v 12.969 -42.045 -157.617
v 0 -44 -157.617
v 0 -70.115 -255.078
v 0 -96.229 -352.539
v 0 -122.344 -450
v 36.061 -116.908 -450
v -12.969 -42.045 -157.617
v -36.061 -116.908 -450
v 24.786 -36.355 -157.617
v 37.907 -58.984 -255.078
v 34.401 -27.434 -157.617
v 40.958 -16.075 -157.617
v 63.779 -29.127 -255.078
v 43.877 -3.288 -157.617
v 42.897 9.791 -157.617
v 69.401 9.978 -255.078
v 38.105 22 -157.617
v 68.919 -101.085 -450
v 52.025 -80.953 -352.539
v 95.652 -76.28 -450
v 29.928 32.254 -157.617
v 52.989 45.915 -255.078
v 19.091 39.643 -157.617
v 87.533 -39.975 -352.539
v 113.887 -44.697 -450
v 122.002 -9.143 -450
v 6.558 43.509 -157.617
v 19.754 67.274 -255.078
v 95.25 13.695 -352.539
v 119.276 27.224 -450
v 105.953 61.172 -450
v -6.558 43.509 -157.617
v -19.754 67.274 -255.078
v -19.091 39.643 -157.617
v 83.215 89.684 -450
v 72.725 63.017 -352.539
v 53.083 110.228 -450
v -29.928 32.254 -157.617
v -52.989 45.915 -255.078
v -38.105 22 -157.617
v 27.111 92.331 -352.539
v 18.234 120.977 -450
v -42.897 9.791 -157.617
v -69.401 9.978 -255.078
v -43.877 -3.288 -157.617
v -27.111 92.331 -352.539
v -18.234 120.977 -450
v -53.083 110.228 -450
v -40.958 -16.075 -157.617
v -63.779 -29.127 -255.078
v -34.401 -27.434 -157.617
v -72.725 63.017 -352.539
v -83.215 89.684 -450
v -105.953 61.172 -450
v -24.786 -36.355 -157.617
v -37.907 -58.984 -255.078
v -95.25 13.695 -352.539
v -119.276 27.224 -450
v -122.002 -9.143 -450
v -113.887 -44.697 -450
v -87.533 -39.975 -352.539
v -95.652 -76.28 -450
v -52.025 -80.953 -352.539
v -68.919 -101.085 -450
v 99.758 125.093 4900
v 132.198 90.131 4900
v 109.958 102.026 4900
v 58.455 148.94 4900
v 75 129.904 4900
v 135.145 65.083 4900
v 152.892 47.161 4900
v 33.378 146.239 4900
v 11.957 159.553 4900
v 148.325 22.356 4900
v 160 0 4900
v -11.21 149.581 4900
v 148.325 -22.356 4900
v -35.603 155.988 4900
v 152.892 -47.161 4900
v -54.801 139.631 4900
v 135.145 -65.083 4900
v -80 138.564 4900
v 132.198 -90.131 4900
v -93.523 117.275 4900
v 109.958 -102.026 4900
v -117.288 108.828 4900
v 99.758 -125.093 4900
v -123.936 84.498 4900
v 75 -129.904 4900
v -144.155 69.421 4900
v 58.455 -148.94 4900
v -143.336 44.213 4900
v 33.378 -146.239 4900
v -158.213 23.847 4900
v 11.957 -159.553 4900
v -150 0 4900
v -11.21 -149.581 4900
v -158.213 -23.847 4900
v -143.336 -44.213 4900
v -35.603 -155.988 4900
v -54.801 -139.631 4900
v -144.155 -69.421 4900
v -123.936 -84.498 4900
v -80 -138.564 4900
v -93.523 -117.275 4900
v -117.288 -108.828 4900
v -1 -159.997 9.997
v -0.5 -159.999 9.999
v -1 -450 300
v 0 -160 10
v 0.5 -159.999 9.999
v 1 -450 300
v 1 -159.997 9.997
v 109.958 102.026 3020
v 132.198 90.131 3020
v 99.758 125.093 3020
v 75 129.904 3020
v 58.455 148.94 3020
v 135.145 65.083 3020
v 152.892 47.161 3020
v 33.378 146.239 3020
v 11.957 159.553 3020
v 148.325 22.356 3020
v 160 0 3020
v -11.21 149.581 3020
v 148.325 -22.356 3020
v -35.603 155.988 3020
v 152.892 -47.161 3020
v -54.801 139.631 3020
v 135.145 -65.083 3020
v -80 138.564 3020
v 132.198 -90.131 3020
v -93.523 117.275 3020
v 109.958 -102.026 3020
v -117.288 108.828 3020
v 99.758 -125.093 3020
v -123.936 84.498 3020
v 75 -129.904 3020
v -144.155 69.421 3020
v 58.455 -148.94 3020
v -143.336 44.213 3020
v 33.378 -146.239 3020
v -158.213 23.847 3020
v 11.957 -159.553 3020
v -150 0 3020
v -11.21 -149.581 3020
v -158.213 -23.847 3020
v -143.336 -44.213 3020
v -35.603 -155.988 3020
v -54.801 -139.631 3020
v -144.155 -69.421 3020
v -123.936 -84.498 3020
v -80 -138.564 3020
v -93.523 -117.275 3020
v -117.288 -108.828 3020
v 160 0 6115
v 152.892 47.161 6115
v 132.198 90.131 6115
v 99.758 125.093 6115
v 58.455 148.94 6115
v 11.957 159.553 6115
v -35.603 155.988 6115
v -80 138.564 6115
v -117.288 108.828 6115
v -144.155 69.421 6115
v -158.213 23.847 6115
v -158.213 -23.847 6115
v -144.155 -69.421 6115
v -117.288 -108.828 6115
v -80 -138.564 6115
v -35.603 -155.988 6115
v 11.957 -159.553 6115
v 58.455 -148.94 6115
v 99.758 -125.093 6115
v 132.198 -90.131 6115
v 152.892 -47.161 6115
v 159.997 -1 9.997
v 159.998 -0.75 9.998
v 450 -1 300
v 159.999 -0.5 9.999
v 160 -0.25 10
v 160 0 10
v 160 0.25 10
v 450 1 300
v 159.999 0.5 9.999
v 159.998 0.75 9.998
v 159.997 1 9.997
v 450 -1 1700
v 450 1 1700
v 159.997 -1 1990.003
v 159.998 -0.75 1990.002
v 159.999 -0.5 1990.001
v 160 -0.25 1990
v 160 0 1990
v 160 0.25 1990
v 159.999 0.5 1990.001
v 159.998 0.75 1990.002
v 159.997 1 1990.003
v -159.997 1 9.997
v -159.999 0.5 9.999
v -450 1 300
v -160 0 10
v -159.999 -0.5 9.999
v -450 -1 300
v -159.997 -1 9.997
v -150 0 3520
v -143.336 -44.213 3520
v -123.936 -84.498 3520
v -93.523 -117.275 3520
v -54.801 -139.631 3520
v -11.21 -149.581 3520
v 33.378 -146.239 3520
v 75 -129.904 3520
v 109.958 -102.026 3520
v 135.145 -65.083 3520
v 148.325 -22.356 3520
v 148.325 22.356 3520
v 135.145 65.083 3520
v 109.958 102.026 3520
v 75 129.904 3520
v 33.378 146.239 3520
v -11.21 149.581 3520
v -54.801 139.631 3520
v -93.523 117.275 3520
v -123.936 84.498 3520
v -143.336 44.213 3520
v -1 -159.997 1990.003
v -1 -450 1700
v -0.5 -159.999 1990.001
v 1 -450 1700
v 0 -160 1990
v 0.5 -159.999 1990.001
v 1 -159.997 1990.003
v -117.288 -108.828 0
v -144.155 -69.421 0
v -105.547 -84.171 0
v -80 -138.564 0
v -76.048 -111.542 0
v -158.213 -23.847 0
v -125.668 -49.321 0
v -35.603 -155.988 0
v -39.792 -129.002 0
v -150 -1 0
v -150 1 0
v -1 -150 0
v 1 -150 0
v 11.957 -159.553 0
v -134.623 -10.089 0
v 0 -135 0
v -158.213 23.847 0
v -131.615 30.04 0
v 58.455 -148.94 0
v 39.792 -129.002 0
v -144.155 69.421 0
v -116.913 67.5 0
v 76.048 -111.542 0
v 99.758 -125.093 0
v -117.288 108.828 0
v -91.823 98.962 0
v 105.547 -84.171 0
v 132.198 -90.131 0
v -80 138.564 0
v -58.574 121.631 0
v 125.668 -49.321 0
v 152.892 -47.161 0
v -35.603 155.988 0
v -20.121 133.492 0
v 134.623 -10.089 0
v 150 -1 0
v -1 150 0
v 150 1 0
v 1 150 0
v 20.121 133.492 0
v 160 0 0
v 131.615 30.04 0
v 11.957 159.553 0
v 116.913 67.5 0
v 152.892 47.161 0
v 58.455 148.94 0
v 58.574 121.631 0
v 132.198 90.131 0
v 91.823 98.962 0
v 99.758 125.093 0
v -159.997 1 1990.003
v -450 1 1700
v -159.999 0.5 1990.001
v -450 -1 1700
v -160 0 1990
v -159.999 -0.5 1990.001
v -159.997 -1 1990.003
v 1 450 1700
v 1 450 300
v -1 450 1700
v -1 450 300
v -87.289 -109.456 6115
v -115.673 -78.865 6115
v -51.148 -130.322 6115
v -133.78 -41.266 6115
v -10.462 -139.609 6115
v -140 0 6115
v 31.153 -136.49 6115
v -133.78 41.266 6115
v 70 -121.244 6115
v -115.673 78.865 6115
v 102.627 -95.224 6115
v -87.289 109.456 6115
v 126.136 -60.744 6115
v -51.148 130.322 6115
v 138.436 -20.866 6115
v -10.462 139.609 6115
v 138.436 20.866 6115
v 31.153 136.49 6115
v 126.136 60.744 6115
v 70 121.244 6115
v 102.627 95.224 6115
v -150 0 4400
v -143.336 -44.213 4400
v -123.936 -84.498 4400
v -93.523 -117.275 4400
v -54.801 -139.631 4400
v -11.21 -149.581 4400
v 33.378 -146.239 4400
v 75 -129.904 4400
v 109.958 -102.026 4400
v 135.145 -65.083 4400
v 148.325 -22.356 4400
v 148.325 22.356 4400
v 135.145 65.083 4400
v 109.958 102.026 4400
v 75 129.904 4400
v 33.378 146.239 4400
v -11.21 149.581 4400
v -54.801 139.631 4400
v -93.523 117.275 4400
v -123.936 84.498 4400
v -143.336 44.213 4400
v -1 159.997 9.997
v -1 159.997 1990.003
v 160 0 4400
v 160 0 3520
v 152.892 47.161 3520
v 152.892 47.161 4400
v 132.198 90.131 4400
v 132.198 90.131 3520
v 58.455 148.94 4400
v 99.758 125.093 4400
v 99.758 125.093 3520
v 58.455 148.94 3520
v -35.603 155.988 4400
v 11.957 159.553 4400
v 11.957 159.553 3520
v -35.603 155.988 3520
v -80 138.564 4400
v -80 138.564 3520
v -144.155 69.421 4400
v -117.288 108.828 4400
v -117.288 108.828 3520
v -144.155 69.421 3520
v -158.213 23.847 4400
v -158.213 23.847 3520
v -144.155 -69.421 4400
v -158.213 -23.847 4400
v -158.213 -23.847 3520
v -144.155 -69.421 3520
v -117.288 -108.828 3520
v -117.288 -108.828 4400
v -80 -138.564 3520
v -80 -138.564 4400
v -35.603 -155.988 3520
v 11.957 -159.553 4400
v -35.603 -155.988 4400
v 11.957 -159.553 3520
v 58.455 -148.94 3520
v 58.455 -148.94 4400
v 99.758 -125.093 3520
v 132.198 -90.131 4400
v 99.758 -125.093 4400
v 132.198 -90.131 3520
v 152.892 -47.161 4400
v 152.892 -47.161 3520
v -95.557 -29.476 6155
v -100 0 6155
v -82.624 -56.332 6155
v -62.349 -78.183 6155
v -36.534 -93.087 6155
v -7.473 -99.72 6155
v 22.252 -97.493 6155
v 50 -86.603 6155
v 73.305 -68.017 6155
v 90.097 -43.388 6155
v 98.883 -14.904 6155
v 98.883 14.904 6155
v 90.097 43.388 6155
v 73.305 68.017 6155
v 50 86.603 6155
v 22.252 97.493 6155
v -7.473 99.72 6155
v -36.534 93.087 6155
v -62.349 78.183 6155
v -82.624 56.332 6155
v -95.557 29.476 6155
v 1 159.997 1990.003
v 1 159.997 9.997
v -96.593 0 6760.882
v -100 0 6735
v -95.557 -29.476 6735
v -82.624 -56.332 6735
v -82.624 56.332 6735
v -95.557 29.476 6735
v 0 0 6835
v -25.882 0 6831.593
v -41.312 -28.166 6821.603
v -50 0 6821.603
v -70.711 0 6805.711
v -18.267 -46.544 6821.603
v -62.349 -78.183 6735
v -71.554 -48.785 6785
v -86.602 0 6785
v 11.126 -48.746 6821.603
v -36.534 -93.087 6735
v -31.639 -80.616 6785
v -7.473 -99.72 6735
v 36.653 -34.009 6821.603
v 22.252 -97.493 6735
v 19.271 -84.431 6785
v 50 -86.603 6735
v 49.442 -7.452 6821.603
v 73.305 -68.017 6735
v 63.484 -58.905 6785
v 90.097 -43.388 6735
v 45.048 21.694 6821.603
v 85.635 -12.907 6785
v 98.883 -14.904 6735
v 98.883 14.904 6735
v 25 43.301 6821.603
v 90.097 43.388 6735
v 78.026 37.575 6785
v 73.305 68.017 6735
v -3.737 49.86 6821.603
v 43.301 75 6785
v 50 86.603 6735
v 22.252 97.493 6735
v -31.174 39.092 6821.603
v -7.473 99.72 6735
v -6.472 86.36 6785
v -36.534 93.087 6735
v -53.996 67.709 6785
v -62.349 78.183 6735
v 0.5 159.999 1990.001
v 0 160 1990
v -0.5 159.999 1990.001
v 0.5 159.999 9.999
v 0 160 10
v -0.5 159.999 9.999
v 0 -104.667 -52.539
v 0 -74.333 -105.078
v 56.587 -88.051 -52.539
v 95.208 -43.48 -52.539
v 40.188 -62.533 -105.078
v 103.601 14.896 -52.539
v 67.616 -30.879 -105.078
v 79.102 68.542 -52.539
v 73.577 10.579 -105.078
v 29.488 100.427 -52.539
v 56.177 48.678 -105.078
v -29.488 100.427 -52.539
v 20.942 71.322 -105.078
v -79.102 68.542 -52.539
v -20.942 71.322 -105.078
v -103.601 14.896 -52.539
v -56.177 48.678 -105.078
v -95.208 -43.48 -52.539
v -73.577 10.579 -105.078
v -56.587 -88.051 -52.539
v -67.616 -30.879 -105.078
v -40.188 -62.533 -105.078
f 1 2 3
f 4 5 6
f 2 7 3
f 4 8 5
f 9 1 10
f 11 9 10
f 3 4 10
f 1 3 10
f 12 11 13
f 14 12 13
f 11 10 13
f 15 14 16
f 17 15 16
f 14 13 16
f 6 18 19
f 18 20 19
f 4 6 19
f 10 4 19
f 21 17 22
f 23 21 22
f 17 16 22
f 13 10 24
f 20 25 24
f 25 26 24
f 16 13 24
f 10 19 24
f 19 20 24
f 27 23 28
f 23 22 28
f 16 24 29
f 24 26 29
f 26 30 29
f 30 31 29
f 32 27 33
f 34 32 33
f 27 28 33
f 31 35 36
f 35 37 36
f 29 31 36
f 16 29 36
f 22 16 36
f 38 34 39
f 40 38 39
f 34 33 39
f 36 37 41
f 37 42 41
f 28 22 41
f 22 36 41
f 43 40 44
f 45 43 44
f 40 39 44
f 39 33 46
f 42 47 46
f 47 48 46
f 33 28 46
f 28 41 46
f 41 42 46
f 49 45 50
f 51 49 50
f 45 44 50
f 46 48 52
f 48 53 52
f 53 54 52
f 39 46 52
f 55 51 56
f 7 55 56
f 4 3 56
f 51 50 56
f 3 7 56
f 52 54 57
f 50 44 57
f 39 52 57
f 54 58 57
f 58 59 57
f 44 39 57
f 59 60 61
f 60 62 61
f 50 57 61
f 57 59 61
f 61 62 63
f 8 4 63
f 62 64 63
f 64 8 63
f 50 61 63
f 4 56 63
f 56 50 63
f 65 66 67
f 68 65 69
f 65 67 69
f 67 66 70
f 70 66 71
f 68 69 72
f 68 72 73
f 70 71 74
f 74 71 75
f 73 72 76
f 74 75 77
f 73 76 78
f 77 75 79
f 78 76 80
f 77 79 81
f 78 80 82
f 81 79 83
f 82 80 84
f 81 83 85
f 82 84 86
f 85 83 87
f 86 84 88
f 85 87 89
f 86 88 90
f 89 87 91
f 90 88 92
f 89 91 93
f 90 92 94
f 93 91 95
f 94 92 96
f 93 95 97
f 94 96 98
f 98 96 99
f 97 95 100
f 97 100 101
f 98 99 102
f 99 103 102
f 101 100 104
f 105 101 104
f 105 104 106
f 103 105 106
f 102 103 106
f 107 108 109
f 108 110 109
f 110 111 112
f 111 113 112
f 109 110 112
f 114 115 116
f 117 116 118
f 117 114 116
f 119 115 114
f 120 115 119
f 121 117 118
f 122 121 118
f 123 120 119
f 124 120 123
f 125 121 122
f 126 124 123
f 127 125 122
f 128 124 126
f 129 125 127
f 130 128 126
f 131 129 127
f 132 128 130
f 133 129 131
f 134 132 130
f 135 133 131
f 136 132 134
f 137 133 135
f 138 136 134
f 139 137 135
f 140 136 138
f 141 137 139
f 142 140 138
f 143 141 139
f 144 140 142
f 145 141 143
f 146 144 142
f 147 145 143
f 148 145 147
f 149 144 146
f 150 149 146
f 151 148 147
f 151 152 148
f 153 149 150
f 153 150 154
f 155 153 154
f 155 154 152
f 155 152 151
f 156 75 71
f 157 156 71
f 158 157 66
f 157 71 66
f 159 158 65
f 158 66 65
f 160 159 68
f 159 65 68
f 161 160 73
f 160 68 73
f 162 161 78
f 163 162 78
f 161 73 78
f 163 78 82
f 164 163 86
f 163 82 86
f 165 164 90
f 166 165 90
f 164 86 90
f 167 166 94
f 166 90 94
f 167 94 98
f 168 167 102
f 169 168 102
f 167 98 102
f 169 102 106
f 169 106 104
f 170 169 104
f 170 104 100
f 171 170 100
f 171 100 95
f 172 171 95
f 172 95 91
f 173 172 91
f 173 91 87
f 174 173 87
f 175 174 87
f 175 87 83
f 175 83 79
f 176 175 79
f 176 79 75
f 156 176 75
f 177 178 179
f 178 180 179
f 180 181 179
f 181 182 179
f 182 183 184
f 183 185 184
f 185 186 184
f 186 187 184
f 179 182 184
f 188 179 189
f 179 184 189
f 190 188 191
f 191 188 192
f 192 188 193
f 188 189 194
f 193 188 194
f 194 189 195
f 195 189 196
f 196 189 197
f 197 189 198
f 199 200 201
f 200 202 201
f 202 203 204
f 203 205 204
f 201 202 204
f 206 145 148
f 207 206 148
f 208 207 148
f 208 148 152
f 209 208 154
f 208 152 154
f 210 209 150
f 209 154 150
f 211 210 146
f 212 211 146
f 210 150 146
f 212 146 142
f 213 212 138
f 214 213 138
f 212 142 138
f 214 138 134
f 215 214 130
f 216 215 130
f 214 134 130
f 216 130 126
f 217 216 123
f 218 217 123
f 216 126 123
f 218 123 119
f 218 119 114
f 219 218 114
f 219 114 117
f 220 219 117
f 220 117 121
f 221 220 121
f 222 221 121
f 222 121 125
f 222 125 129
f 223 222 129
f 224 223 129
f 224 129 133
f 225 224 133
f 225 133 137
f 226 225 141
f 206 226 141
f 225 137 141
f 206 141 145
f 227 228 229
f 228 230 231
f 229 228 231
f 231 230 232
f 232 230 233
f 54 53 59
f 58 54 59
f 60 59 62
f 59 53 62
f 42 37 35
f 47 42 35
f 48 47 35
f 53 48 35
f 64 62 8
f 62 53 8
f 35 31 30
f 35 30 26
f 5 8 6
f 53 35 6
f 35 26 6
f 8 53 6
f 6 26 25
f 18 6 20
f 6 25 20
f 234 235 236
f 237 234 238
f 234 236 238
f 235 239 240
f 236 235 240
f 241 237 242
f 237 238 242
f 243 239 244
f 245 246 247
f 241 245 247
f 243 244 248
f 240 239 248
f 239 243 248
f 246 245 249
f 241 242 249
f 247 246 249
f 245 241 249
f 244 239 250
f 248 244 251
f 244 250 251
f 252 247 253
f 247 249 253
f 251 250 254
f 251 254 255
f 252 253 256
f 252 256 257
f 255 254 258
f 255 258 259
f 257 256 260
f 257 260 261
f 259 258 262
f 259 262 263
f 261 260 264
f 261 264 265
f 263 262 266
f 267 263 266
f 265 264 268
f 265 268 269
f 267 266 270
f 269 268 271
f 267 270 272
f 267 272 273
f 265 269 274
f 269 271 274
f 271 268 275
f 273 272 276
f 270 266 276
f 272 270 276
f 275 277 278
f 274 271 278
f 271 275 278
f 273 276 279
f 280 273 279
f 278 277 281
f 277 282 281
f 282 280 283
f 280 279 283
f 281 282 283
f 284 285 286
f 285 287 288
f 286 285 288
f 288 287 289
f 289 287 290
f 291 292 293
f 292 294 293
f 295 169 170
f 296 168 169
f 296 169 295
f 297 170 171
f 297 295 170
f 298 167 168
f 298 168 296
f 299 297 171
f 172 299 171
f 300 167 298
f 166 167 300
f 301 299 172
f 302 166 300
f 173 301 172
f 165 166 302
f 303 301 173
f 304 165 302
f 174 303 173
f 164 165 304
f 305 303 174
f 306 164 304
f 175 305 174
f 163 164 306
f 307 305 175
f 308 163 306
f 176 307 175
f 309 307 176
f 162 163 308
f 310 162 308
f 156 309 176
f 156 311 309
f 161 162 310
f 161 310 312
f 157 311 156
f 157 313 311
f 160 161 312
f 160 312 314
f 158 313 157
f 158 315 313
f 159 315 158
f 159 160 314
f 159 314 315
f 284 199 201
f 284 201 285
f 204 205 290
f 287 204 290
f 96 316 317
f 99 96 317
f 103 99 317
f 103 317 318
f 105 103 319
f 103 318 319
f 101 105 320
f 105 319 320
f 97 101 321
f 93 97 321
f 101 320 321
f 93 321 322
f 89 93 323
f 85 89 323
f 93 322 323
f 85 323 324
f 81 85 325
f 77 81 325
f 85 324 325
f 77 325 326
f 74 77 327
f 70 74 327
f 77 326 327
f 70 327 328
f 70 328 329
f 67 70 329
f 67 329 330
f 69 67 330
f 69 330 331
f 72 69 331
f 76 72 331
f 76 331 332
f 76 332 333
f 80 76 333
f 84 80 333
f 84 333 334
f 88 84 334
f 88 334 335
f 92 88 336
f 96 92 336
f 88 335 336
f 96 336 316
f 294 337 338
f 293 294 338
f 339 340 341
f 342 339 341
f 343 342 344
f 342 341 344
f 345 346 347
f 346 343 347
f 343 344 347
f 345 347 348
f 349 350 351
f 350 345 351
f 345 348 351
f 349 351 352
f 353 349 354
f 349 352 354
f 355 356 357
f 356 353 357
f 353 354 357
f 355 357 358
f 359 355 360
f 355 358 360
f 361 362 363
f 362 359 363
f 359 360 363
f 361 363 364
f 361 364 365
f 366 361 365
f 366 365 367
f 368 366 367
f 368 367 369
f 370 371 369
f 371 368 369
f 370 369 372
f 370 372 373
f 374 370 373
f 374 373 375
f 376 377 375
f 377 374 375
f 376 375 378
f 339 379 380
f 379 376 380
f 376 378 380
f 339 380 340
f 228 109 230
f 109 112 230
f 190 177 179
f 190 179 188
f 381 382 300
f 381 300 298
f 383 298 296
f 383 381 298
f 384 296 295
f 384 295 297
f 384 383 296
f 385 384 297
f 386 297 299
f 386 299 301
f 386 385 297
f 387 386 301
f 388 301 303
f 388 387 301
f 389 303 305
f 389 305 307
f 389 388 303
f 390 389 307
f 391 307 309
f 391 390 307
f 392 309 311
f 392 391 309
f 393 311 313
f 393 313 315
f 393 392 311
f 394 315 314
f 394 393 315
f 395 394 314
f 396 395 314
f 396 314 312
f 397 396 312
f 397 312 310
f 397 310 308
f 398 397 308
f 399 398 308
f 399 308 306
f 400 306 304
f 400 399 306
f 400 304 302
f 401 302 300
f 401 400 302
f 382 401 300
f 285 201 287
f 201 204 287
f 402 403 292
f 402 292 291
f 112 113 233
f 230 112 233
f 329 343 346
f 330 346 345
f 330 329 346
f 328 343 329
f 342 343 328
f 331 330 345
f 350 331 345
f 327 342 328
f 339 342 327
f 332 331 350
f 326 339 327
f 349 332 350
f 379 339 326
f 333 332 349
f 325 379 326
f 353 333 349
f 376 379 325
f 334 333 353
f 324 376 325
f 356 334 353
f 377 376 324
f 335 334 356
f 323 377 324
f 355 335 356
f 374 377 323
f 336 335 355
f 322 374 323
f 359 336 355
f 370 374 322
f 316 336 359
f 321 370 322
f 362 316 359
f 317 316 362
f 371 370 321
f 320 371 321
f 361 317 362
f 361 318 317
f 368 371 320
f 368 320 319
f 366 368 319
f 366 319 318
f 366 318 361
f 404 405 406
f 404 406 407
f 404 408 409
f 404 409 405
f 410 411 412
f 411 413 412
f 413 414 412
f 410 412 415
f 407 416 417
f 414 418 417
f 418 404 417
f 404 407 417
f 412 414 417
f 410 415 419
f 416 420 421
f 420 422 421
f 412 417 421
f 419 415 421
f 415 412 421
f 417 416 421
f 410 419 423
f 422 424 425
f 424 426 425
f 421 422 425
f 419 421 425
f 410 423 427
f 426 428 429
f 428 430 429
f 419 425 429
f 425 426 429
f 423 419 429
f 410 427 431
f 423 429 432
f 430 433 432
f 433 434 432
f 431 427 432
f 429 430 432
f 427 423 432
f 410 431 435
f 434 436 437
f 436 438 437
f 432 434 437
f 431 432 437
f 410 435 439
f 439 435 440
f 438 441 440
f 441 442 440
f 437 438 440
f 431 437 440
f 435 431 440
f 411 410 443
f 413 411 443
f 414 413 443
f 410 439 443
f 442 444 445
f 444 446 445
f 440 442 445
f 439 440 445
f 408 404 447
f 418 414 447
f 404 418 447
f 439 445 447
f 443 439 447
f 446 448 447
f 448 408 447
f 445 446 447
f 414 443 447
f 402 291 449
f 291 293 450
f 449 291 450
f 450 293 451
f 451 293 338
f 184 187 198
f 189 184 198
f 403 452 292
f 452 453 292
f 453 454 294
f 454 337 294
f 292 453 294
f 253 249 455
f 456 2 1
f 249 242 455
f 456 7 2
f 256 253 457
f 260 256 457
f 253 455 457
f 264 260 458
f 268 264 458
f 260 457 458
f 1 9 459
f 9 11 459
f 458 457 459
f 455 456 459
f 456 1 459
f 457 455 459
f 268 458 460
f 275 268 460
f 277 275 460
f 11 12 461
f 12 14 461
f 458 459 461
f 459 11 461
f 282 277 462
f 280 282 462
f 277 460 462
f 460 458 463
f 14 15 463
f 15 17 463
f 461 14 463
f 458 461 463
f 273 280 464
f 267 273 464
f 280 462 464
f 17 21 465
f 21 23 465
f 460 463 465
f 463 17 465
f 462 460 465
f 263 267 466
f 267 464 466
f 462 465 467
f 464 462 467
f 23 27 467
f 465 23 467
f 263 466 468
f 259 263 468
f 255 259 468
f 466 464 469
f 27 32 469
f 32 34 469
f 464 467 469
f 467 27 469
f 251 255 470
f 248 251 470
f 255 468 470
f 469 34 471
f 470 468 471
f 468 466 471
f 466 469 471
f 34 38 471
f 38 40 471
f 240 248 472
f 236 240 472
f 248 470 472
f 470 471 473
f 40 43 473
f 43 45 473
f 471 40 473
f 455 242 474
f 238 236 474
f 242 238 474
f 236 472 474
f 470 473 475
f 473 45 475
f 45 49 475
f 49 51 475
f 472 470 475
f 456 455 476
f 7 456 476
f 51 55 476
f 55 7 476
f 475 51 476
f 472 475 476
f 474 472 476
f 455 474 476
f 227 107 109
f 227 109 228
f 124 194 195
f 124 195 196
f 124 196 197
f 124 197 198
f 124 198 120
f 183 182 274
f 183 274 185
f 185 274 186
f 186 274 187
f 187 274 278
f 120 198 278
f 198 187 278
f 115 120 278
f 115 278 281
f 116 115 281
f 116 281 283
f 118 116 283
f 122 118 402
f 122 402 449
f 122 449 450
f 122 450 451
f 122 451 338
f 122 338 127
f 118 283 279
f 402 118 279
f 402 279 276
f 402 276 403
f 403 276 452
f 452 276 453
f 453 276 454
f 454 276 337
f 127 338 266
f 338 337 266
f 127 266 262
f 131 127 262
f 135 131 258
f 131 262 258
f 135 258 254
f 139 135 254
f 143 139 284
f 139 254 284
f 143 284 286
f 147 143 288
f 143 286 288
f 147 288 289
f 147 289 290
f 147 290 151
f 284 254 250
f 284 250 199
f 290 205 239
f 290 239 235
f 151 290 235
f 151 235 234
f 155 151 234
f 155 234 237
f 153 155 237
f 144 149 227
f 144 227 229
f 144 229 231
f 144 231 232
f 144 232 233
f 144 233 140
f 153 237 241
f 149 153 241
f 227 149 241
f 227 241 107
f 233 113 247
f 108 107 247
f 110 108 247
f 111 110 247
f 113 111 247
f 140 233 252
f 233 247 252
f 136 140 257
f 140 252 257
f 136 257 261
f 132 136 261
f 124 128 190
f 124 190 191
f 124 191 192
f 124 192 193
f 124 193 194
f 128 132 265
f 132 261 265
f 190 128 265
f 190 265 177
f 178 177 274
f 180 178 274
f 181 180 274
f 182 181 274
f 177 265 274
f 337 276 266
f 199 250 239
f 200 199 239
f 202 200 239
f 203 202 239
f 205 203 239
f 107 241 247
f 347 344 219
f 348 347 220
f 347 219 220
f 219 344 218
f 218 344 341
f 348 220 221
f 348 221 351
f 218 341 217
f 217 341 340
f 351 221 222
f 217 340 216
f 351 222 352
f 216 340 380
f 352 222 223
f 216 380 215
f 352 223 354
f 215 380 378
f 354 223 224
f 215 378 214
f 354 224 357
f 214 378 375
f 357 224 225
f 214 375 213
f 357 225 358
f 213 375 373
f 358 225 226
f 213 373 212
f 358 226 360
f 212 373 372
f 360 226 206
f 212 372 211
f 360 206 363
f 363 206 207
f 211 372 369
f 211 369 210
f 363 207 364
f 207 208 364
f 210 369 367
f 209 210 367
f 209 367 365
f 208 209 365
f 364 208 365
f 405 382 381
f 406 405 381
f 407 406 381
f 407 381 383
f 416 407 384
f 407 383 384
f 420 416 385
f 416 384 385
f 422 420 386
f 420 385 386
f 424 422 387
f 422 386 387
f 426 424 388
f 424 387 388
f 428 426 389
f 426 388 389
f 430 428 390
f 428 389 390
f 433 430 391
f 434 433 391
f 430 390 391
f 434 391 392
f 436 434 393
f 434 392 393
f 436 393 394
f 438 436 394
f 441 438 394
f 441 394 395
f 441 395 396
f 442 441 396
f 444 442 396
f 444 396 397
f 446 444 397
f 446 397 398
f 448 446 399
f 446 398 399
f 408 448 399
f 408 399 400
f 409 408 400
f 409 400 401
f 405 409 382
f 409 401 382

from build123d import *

# Parameters (mm, degrees)
SKETCH_R           = 160
PAD_DEPTH          = 6115
CHAMFER_SIZE       = 40
PAD001_DEPTH       = 1
POLARPATTERN_COUNT = 4
SKETCH004_R        = 160
SKETCH004_R_2      = 150
POCKET_DEPTH       = 500
SKETCH005_R        = 160
SKETCH005_R_2      = 150
POCKET001_DEPTH    = 500


with BuildPart() as part:
    # Sketch → Pad (new body)
    with BuildSketch(Plane.XY):
        Circle(SKETCH_R)
    extrude(amount=PAD_DEPTH)

    # Sketch001 → Revolution (revolve)
    with BuildSketch(Plane.XZ):
        with BuildLine():
            ThreePointArc((0, 6835), (-70.710632, 6805.710724), (-100, 6735.00013))
            Line((-100, 6735.00013), (-100, 6115))
            Line((-100, 6115), (0, 6115))
            Line((0, 6115), (0, 6735.00013))
            Line((0, 6835), (0, 6735.00013))
        make_face()
    revolve(axis=Axis((0, 0, 0), (0, 0, 1)))

    # Sketch002 → Revolution001 (revolve)
    with BuildSketch(Plane.YZ):
        Polygon((-135, 0), (-44, -157.616623), (-122.34389, -450), (0, -450), (0, 0), align=None)
    revolve(axis=Axis((0, 0, 0), (0, 0, 1)))

    # Chamfer
    chamfer_edges = [part.edges().sort_by_distance(p)[0] for p in [
        (100, 0, 6115),
    ]]
    chamfer(chamfer_edges, length=CHAMFER_SIZE)

    # Sketch003 → Pad001 (join, symmetric)
    with BuildSketch(Plane.YZ):
        Polygon((-150, 2000), (-150, 0), (-450, 300), (-450, 1700), align=None)
    pad001 = extrude(amount=PAD001_DEPTH, both=True)

    # PolarPattern: Pad001 ×4 about axis
    polarpattern_axis = Axis((0, 0, 0), (0, 0, 1))
    for i in range(1, POLARPATTERN_COUNT):
        add(pad001.rotate(polarpattern_axis, i * 360 / POLARPATTERN_COUNT))

    # Sketch004 (on DatumPlane) → Pocket (cut)
    with BuildSketch(Plane(origin=(0, 0, 3020), x_dir=(-1, 0, 0), z_dir=(0, 0, 1))):
        Circle(SKETCH004_R)
        Circle(SKETCH004_R_2, mode=Mode.SUBTRACT)
    extrude(amount=POCKET_DEPTH, mode=Mode.SUBTRACT)

    # Sketch005 (on DatumPlane) → Pocket001 (cut)
    with BuildSketch(Plane(origin=(0, 0, 4400), x_dir=(-1, 0, 0), z_dir=(0, 0, 1))):
        Circle(SKETCH005_R)
        Circle(SKETCH005_R_2, mode=Mode.SUBTRACT)
    extrude(amount=POCKET001_DEPTH, mode=Mode.SUBTRACT)


solid = part.part
